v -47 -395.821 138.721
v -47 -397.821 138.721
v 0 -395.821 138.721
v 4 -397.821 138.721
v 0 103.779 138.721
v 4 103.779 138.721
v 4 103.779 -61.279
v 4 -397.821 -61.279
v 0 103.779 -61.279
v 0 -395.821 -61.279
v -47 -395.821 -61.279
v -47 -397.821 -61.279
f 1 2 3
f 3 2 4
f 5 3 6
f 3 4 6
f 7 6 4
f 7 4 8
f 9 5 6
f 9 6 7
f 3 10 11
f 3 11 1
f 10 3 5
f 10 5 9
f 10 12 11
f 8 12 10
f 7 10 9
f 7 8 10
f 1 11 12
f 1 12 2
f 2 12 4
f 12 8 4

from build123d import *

# Parameters (mm, degrees)
SKETCH1_W           = 200
SKETCH1_H           = 501.6
BOSS_EXTRUDE1_DEPTH = 4
SKETCH2_W           = 200
SKETCH2_H           = 2
BOSS_EXTRUDE2_DEPTH = 47


with BuildPart() as part:
    # Sketch1 → Boss-Extrude1 (new body)
    with BuildSketch(Plane(origin=(0, 0, 0), x_dir=(0, 0, -1), z_dir=(1, 0, 0))):
        with Locations((-38.720930233, -147.020930233)):
            Rectangle(SKETCH1_W, SKETCH1_H)
    extrude(amount=BOSS_EXTRUDE1_DEPTH)

    # Sketch2 → Boss-Extrude2 (add)
    with BuildSketch(Plane.ZY):
        with Locations((38.720930233, -396.820930233)):
            Rectangle(SKETCH2_W, SKETCH2_H)
    extrude(amount=BOSS_EXTRUDE2_DEPTH)


solid = part.part
